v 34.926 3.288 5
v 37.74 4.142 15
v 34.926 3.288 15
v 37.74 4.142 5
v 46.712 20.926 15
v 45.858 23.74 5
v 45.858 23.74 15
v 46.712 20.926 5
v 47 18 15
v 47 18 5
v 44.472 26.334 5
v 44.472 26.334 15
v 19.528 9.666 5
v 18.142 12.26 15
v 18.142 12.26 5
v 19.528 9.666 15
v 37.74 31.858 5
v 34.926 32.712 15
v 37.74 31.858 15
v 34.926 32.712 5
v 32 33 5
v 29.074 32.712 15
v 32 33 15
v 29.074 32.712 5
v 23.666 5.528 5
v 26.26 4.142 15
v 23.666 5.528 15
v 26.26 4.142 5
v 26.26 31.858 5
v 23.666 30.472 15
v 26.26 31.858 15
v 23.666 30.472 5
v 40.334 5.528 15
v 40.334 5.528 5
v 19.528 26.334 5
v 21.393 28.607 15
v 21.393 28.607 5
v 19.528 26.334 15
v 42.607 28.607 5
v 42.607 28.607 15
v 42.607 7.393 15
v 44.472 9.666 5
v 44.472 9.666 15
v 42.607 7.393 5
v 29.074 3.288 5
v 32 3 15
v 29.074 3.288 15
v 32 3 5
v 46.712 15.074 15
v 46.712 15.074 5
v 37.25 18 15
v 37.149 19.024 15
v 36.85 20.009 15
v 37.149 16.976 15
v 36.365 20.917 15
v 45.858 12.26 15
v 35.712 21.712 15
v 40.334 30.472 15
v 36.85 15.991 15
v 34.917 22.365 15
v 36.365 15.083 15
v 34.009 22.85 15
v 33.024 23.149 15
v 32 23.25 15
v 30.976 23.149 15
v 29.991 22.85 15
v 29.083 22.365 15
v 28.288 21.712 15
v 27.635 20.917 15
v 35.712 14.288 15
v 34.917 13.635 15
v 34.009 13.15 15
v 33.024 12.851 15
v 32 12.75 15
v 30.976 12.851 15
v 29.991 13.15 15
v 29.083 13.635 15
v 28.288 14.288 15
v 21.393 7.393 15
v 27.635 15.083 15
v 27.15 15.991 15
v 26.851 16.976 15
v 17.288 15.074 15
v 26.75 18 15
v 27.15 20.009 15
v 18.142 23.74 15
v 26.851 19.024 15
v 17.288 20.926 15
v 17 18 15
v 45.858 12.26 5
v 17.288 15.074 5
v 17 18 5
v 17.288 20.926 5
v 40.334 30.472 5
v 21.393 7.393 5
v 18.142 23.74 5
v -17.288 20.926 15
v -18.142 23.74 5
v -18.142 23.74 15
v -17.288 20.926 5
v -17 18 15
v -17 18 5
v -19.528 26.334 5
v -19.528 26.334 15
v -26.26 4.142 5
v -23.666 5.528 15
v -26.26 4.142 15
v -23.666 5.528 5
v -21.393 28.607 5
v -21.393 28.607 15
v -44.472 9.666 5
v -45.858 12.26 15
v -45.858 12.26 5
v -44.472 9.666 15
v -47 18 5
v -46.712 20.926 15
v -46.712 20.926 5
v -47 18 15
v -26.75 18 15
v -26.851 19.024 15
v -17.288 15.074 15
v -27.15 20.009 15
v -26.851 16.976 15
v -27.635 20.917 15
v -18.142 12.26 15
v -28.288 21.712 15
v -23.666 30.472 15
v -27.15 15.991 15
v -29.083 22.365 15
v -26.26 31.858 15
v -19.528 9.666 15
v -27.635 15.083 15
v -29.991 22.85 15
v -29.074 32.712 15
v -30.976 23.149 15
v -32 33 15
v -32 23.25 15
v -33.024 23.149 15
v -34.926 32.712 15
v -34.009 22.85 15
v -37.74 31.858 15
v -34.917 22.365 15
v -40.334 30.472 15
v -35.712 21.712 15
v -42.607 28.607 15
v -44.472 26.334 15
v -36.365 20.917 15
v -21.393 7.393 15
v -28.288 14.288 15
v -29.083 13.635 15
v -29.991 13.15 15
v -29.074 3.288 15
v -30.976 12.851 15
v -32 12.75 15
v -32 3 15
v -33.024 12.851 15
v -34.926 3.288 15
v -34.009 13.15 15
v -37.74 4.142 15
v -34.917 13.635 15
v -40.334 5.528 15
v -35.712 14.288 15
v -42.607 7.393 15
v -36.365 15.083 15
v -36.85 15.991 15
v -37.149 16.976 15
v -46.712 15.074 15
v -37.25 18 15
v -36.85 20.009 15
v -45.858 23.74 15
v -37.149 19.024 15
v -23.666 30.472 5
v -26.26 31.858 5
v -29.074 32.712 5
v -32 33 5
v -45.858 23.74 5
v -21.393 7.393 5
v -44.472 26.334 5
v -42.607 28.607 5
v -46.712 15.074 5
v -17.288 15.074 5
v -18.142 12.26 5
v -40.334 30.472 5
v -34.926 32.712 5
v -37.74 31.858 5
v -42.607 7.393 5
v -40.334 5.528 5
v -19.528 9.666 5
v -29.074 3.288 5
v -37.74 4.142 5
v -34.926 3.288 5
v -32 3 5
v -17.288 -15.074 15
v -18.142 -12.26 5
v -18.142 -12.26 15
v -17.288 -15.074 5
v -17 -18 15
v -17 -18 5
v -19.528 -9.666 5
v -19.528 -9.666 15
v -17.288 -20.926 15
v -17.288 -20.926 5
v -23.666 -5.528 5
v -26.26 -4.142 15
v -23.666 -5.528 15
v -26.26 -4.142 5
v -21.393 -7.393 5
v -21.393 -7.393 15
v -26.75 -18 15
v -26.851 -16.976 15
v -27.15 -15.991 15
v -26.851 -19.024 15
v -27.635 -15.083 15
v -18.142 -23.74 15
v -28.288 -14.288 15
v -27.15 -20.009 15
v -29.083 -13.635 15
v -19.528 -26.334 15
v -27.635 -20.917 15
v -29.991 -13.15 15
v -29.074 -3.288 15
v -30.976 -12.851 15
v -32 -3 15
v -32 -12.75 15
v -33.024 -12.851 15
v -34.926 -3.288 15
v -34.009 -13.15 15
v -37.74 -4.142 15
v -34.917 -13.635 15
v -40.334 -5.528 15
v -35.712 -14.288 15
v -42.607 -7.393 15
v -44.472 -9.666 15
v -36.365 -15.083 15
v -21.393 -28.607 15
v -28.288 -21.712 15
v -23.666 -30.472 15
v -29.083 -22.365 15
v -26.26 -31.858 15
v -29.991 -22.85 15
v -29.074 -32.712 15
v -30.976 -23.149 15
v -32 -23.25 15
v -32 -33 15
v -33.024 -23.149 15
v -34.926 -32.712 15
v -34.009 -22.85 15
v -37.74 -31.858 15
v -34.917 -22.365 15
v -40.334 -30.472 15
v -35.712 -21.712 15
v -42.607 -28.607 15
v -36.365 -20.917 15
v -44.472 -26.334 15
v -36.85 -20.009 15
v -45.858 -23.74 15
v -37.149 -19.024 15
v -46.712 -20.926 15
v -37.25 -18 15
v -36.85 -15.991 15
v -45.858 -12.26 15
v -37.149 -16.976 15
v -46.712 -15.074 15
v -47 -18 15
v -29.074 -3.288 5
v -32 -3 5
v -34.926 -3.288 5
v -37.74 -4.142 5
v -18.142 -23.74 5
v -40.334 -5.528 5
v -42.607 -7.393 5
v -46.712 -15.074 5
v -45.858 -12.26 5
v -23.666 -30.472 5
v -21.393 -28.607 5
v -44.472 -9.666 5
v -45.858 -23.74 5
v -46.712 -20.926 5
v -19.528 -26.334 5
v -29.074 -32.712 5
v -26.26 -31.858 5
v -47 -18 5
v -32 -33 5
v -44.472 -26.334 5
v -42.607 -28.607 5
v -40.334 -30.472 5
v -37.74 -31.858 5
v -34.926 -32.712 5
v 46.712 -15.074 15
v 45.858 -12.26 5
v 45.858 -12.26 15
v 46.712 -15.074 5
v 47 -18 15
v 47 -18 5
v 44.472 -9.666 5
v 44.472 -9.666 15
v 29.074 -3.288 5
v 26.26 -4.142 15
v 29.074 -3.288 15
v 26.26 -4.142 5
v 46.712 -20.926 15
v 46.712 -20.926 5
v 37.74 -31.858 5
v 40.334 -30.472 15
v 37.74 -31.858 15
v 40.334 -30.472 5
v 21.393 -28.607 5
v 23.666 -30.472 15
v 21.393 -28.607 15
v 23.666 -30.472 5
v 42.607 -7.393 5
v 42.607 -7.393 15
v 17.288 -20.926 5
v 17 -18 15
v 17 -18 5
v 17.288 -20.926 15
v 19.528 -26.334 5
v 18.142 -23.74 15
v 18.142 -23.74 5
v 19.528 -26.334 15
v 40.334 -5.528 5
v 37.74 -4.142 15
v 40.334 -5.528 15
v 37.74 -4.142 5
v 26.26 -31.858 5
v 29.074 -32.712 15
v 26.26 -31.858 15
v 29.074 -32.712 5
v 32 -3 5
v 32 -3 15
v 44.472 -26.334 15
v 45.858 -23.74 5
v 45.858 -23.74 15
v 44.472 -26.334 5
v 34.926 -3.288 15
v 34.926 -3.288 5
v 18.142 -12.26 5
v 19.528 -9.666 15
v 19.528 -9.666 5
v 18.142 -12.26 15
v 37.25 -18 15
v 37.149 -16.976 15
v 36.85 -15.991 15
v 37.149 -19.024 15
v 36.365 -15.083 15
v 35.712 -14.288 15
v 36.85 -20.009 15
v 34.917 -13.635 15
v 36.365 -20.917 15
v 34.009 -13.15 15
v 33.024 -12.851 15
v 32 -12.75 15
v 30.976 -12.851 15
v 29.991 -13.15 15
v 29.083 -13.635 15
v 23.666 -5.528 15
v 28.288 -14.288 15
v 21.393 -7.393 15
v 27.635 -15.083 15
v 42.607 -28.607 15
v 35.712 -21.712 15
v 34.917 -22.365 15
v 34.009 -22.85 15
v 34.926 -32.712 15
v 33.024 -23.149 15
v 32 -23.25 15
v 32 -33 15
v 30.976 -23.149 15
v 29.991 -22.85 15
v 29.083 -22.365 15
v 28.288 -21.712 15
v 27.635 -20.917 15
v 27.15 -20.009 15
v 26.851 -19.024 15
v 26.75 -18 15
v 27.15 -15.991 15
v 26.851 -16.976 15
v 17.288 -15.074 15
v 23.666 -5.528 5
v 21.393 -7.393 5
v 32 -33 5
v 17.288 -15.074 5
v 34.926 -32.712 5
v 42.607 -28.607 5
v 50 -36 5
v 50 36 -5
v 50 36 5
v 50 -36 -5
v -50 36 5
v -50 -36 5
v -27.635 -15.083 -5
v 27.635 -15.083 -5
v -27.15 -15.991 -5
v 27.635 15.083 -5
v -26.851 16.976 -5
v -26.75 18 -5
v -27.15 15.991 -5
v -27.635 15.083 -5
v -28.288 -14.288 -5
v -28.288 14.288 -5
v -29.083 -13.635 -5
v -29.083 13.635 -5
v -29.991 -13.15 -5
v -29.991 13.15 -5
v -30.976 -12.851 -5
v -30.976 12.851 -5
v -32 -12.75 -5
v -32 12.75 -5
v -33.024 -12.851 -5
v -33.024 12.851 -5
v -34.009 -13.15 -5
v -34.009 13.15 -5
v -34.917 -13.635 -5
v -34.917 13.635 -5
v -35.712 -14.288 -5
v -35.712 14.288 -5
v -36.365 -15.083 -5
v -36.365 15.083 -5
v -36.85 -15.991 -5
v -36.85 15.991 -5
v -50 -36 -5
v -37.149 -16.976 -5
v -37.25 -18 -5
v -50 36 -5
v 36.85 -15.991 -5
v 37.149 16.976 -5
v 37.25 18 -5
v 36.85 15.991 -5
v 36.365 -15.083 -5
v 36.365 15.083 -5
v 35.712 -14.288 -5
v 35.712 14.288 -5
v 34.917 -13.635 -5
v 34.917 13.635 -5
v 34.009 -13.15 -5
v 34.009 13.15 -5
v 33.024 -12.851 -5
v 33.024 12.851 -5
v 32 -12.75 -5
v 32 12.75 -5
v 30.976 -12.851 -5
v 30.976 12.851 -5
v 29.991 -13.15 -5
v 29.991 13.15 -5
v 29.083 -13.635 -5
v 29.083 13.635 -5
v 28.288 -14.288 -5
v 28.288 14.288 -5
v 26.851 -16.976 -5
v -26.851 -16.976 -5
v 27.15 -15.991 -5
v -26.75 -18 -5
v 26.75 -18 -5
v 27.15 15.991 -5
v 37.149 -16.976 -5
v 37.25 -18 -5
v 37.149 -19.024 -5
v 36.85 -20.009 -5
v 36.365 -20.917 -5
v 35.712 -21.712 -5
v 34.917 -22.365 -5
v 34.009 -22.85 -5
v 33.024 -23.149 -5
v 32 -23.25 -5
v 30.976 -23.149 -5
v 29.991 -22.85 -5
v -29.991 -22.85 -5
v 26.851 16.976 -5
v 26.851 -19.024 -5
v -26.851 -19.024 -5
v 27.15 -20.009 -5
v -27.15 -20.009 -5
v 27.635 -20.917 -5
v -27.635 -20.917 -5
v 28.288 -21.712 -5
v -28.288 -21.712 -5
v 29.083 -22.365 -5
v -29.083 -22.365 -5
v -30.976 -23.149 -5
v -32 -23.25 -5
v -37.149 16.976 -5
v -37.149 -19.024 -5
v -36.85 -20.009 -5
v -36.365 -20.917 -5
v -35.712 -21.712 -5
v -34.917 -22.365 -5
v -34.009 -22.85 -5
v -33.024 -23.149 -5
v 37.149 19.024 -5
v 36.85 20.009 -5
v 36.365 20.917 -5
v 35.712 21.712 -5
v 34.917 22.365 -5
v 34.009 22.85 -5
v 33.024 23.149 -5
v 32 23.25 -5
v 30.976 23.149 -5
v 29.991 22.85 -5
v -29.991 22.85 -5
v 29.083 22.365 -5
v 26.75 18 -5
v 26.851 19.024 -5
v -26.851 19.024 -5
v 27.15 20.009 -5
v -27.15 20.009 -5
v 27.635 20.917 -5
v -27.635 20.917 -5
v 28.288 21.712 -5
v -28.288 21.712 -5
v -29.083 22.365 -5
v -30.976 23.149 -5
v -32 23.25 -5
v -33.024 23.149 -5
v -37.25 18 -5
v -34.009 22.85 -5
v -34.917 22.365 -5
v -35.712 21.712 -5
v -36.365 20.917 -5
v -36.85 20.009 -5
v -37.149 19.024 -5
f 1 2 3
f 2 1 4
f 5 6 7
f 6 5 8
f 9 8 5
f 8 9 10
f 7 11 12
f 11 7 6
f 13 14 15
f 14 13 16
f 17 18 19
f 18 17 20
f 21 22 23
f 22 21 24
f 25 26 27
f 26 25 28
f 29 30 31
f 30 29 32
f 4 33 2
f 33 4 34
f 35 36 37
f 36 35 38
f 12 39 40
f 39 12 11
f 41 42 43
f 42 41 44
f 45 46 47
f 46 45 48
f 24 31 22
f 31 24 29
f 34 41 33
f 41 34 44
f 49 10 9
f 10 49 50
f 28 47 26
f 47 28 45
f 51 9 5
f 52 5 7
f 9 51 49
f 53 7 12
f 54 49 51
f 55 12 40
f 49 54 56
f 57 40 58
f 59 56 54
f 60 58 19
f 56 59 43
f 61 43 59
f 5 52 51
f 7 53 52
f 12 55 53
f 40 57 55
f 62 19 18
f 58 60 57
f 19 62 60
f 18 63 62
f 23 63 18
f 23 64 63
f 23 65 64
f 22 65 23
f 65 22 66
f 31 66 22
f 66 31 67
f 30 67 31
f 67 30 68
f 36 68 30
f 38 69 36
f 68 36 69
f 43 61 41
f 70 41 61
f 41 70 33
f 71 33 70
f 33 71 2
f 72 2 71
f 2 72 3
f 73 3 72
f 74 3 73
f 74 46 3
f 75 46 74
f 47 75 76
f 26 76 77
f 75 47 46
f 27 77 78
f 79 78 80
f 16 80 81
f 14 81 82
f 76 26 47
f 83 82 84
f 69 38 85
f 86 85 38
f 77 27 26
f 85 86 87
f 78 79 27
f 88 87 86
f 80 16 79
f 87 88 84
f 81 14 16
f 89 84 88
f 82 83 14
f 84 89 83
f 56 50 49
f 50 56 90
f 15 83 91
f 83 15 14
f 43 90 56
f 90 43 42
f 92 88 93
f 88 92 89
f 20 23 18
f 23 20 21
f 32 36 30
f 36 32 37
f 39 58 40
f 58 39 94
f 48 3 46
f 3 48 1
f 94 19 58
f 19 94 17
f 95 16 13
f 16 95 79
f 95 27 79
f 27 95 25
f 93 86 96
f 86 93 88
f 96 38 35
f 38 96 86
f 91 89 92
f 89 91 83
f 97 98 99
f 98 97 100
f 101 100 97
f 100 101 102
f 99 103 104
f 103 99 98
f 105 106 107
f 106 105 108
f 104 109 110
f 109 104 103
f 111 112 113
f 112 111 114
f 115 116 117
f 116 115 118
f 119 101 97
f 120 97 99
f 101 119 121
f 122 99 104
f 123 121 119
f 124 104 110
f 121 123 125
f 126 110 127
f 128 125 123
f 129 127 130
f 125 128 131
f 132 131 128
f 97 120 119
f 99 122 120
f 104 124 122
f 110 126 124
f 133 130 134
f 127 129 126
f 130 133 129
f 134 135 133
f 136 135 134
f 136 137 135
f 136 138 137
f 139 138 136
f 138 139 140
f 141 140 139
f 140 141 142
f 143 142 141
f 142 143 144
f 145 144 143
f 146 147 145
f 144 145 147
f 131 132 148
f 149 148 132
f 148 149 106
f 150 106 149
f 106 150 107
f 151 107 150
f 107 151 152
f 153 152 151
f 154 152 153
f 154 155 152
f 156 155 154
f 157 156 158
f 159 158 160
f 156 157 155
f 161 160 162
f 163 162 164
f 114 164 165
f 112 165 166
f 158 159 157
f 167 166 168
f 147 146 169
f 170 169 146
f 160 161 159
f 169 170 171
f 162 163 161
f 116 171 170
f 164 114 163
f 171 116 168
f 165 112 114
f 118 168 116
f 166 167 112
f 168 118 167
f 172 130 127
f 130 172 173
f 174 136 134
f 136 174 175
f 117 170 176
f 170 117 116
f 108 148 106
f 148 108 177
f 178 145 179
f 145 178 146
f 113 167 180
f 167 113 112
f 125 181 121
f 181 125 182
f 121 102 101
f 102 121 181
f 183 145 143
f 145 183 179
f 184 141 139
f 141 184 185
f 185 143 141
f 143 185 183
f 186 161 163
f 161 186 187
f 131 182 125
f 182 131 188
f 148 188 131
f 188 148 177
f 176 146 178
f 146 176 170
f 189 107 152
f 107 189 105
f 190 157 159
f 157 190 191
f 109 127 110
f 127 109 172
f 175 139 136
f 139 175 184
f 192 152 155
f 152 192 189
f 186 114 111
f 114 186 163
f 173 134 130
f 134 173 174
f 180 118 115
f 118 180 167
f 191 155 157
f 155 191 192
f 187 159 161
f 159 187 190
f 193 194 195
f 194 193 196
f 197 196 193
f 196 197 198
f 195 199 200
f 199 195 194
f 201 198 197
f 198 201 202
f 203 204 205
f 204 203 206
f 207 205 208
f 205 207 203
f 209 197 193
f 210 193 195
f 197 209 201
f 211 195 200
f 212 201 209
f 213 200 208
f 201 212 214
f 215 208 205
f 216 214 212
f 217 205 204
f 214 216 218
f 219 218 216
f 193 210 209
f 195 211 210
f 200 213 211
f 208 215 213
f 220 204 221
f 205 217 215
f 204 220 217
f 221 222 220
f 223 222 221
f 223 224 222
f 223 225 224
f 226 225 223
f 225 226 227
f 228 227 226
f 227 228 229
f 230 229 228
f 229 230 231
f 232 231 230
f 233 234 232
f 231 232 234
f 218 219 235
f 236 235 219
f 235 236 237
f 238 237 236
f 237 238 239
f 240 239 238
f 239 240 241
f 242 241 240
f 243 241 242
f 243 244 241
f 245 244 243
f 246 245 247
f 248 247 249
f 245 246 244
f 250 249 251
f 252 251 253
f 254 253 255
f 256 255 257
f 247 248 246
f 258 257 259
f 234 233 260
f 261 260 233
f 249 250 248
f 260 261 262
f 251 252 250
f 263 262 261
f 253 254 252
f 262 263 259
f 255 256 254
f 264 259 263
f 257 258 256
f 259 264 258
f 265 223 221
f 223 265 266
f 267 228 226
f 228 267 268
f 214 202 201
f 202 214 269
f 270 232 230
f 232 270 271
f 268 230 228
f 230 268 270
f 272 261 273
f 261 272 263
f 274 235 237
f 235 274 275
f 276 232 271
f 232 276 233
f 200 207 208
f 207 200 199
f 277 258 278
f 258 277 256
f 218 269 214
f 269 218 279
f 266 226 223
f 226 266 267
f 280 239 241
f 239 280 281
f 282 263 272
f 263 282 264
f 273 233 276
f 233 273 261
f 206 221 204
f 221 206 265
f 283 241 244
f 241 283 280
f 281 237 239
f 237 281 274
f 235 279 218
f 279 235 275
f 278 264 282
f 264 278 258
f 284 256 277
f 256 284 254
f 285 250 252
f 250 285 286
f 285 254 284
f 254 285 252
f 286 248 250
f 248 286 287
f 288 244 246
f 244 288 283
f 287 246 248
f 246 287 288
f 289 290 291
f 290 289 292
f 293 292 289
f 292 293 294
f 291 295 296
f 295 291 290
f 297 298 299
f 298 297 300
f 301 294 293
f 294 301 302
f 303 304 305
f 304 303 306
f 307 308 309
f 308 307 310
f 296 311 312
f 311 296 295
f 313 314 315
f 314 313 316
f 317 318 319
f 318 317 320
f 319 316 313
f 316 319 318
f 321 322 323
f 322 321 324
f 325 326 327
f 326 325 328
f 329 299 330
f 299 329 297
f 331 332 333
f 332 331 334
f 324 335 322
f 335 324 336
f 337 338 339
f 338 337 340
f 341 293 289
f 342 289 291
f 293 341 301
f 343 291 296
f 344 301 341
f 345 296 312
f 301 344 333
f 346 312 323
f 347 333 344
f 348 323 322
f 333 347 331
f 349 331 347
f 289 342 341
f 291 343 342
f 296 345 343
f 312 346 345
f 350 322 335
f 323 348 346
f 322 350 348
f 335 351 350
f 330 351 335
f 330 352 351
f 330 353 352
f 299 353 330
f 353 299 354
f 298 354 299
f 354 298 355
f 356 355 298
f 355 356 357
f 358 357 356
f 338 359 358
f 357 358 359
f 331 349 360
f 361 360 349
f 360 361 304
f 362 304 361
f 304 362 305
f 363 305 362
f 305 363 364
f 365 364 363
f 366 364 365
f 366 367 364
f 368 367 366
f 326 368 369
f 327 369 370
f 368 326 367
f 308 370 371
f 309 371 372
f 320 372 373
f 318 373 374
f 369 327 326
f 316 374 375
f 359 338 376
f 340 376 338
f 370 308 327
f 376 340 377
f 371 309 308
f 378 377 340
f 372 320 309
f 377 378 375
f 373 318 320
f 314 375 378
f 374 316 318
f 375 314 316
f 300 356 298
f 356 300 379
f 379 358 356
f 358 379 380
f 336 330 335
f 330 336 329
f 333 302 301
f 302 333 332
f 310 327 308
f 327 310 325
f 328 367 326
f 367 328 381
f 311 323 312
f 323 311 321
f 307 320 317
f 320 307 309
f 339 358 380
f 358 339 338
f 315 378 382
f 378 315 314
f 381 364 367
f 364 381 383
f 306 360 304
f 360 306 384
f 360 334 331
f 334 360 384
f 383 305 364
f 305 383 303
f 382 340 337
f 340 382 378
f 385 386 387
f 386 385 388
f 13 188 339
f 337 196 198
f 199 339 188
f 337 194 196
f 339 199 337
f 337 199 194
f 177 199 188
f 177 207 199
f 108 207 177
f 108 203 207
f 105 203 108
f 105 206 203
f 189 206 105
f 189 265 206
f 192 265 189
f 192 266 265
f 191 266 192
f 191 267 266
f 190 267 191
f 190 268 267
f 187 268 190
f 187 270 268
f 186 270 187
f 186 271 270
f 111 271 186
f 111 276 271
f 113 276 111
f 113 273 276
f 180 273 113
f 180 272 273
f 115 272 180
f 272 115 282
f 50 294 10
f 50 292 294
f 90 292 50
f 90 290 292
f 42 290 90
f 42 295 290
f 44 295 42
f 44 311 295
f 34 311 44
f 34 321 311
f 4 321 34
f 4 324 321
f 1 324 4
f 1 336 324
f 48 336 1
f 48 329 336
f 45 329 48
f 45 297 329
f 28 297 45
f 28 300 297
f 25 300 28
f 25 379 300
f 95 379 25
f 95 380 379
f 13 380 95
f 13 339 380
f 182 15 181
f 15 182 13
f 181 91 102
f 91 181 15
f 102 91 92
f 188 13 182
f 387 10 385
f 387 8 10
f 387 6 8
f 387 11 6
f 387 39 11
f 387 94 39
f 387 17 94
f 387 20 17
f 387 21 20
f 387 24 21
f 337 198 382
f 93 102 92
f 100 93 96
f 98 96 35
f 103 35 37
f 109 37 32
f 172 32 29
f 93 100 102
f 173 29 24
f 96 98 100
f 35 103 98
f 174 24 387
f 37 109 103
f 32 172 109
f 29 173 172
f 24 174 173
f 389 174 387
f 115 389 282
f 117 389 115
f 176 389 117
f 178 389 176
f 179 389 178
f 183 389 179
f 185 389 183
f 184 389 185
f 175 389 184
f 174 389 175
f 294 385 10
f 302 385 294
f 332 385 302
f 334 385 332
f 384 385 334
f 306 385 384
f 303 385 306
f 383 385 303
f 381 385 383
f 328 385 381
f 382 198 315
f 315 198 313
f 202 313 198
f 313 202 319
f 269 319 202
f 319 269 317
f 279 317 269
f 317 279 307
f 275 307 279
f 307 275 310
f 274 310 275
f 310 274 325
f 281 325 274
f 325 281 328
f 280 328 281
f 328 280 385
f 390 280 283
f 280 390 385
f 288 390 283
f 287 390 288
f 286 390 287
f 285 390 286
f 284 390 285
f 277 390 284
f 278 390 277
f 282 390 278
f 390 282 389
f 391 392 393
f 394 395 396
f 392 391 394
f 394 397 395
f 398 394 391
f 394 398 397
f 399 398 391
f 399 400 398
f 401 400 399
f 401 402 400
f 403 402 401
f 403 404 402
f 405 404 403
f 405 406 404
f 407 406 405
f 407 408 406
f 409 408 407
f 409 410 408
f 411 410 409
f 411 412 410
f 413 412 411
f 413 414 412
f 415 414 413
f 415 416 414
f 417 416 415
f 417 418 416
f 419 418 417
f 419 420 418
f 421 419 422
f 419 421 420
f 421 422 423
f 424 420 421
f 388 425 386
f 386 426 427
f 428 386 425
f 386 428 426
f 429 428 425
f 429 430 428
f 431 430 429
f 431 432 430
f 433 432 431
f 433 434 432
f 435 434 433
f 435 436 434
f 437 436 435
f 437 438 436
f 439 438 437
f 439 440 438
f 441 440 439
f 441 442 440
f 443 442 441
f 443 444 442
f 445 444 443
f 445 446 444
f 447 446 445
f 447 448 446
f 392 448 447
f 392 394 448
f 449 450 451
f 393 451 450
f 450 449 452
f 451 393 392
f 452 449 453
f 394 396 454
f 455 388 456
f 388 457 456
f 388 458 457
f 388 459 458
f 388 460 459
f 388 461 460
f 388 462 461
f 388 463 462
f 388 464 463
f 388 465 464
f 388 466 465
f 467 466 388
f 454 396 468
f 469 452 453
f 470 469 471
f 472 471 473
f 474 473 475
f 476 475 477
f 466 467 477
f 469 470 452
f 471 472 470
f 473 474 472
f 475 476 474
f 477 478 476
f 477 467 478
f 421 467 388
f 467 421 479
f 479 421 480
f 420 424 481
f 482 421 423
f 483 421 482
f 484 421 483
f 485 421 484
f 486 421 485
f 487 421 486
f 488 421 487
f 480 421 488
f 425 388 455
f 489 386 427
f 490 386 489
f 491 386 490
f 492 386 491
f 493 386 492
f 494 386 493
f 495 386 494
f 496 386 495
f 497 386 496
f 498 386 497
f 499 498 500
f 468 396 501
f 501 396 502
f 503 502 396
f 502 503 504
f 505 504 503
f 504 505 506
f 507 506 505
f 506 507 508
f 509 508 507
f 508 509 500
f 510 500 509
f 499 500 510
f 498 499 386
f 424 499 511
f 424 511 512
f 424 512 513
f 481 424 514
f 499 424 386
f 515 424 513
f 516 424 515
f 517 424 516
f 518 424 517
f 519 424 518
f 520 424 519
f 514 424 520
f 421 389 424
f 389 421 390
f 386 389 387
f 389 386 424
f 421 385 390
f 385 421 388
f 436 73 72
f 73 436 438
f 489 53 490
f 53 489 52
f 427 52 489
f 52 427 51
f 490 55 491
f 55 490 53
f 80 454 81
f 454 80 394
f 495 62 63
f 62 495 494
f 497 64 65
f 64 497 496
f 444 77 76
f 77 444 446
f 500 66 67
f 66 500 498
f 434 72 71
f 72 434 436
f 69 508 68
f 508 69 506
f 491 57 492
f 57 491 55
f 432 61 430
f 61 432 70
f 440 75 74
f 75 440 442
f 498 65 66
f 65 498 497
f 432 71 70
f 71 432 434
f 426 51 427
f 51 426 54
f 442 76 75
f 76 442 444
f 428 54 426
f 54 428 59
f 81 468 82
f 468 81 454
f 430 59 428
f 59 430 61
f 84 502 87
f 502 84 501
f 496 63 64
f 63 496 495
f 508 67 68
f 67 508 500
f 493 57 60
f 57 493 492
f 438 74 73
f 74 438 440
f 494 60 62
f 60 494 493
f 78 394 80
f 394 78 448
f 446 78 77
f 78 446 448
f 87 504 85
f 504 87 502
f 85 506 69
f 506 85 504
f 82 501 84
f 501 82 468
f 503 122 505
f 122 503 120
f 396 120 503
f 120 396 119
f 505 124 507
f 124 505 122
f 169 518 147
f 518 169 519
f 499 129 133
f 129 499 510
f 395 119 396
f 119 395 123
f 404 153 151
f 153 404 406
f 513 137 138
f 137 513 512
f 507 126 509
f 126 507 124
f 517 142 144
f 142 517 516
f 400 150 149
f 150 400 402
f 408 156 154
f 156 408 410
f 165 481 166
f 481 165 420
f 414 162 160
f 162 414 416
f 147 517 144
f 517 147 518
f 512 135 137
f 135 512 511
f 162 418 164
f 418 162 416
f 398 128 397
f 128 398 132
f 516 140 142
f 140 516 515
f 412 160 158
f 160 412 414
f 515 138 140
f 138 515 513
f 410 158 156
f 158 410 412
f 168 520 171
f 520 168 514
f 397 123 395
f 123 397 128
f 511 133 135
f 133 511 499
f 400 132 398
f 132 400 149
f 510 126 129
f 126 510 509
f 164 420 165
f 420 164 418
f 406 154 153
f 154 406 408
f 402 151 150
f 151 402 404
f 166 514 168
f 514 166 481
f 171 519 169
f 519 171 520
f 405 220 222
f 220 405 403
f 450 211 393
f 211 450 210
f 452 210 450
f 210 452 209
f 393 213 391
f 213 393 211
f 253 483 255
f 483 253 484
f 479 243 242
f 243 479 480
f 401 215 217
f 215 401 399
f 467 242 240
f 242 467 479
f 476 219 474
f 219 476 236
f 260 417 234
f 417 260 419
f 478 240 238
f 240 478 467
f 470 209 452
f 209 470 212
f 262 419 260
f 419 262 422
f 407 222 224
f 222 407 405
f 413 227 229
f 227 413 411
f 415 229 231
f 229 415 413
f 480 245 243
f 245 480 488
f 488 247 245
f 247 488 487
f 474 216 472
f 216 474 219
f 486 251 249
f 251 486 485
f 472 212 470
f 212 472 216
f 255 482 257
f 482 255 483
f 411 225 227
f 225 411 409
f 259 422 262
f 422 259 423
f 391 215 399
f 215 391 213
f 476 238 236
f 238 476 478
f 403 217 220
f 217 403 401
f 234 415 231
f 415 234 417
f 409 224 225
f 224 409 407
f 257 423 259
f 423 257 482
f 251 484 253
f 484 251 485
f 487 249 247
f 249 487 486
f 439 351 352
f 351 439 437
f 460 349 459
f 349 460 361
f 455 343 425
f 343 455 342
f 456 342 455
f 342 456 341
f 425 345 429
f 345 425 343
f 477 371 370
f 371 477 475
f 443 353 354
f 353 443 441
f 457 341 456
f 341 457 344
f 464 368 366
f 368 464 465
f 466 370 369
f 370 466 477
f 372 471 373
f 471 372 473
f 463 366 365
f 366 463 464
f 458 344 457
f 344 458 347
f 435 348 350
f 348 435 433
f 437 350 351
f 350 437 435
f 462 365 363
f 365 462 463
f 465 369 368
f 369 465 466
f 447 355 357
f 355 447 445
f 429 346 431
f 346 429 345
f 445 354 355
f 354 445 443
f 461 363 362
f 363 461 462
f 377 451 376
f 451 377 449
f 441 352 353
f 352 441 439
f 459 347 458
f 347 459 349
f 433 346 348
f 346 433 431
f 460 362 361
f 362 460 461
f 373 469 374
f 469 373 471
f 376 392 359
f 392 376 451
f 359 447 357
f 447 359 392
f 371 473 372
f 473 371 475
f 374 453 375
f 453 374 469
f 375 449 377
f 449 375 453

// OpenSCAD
$fn = 32;

// ----------------------------------------------------------------------
// Anchor pads 100 x 72 x 20
// four corner bosses with anchor holes
// ----------------------------------------------------------------------

// --- parameters (mm) ---
plate = [100, 72, 10];  // base plate size (x, y, z)
pads = 4;               // boss count, one per corner
edge = 18;              // boss centre offset from the plate edge
boss_d = 30;            // boss diameter
boss_h = 10;            // boss height above the base plate
hole_d = 10.5;          // hole diameter

// --- derived feature positions (mm) ---
height = plate[2] + boss_h;      // = 20   overall height of the part
corner_x = plate[0] / 2 - edge;  // = 32   boss centre X
corner_y = plate[1] / 2 - edge;  // = 18   boss centre Y
feature_centers = [
  [corner_x, corner_y],
  [-corner_x, corner_y],
  [-corner_x, -corner_y],
  [corner_x, -corner_y]
];   // boss centres, anchor holes are drilled there

// base plate, four bosses standing on it, anchor holes all the way through
difference() {
  union() {
    cube(plate, center = true);
    for (centre = feature_centers)
      translate([centre[0], centre[1], plate[2] / 2 - 1])
        cylinder(d = boss_d, h = boss_h + 1);
  }
  for (centre = feature_centers)
    translate([centre[0], centre[1], -height])
      cylinder(d = hole_d, h = 2 * height + 2);  // through boss and plate
}
